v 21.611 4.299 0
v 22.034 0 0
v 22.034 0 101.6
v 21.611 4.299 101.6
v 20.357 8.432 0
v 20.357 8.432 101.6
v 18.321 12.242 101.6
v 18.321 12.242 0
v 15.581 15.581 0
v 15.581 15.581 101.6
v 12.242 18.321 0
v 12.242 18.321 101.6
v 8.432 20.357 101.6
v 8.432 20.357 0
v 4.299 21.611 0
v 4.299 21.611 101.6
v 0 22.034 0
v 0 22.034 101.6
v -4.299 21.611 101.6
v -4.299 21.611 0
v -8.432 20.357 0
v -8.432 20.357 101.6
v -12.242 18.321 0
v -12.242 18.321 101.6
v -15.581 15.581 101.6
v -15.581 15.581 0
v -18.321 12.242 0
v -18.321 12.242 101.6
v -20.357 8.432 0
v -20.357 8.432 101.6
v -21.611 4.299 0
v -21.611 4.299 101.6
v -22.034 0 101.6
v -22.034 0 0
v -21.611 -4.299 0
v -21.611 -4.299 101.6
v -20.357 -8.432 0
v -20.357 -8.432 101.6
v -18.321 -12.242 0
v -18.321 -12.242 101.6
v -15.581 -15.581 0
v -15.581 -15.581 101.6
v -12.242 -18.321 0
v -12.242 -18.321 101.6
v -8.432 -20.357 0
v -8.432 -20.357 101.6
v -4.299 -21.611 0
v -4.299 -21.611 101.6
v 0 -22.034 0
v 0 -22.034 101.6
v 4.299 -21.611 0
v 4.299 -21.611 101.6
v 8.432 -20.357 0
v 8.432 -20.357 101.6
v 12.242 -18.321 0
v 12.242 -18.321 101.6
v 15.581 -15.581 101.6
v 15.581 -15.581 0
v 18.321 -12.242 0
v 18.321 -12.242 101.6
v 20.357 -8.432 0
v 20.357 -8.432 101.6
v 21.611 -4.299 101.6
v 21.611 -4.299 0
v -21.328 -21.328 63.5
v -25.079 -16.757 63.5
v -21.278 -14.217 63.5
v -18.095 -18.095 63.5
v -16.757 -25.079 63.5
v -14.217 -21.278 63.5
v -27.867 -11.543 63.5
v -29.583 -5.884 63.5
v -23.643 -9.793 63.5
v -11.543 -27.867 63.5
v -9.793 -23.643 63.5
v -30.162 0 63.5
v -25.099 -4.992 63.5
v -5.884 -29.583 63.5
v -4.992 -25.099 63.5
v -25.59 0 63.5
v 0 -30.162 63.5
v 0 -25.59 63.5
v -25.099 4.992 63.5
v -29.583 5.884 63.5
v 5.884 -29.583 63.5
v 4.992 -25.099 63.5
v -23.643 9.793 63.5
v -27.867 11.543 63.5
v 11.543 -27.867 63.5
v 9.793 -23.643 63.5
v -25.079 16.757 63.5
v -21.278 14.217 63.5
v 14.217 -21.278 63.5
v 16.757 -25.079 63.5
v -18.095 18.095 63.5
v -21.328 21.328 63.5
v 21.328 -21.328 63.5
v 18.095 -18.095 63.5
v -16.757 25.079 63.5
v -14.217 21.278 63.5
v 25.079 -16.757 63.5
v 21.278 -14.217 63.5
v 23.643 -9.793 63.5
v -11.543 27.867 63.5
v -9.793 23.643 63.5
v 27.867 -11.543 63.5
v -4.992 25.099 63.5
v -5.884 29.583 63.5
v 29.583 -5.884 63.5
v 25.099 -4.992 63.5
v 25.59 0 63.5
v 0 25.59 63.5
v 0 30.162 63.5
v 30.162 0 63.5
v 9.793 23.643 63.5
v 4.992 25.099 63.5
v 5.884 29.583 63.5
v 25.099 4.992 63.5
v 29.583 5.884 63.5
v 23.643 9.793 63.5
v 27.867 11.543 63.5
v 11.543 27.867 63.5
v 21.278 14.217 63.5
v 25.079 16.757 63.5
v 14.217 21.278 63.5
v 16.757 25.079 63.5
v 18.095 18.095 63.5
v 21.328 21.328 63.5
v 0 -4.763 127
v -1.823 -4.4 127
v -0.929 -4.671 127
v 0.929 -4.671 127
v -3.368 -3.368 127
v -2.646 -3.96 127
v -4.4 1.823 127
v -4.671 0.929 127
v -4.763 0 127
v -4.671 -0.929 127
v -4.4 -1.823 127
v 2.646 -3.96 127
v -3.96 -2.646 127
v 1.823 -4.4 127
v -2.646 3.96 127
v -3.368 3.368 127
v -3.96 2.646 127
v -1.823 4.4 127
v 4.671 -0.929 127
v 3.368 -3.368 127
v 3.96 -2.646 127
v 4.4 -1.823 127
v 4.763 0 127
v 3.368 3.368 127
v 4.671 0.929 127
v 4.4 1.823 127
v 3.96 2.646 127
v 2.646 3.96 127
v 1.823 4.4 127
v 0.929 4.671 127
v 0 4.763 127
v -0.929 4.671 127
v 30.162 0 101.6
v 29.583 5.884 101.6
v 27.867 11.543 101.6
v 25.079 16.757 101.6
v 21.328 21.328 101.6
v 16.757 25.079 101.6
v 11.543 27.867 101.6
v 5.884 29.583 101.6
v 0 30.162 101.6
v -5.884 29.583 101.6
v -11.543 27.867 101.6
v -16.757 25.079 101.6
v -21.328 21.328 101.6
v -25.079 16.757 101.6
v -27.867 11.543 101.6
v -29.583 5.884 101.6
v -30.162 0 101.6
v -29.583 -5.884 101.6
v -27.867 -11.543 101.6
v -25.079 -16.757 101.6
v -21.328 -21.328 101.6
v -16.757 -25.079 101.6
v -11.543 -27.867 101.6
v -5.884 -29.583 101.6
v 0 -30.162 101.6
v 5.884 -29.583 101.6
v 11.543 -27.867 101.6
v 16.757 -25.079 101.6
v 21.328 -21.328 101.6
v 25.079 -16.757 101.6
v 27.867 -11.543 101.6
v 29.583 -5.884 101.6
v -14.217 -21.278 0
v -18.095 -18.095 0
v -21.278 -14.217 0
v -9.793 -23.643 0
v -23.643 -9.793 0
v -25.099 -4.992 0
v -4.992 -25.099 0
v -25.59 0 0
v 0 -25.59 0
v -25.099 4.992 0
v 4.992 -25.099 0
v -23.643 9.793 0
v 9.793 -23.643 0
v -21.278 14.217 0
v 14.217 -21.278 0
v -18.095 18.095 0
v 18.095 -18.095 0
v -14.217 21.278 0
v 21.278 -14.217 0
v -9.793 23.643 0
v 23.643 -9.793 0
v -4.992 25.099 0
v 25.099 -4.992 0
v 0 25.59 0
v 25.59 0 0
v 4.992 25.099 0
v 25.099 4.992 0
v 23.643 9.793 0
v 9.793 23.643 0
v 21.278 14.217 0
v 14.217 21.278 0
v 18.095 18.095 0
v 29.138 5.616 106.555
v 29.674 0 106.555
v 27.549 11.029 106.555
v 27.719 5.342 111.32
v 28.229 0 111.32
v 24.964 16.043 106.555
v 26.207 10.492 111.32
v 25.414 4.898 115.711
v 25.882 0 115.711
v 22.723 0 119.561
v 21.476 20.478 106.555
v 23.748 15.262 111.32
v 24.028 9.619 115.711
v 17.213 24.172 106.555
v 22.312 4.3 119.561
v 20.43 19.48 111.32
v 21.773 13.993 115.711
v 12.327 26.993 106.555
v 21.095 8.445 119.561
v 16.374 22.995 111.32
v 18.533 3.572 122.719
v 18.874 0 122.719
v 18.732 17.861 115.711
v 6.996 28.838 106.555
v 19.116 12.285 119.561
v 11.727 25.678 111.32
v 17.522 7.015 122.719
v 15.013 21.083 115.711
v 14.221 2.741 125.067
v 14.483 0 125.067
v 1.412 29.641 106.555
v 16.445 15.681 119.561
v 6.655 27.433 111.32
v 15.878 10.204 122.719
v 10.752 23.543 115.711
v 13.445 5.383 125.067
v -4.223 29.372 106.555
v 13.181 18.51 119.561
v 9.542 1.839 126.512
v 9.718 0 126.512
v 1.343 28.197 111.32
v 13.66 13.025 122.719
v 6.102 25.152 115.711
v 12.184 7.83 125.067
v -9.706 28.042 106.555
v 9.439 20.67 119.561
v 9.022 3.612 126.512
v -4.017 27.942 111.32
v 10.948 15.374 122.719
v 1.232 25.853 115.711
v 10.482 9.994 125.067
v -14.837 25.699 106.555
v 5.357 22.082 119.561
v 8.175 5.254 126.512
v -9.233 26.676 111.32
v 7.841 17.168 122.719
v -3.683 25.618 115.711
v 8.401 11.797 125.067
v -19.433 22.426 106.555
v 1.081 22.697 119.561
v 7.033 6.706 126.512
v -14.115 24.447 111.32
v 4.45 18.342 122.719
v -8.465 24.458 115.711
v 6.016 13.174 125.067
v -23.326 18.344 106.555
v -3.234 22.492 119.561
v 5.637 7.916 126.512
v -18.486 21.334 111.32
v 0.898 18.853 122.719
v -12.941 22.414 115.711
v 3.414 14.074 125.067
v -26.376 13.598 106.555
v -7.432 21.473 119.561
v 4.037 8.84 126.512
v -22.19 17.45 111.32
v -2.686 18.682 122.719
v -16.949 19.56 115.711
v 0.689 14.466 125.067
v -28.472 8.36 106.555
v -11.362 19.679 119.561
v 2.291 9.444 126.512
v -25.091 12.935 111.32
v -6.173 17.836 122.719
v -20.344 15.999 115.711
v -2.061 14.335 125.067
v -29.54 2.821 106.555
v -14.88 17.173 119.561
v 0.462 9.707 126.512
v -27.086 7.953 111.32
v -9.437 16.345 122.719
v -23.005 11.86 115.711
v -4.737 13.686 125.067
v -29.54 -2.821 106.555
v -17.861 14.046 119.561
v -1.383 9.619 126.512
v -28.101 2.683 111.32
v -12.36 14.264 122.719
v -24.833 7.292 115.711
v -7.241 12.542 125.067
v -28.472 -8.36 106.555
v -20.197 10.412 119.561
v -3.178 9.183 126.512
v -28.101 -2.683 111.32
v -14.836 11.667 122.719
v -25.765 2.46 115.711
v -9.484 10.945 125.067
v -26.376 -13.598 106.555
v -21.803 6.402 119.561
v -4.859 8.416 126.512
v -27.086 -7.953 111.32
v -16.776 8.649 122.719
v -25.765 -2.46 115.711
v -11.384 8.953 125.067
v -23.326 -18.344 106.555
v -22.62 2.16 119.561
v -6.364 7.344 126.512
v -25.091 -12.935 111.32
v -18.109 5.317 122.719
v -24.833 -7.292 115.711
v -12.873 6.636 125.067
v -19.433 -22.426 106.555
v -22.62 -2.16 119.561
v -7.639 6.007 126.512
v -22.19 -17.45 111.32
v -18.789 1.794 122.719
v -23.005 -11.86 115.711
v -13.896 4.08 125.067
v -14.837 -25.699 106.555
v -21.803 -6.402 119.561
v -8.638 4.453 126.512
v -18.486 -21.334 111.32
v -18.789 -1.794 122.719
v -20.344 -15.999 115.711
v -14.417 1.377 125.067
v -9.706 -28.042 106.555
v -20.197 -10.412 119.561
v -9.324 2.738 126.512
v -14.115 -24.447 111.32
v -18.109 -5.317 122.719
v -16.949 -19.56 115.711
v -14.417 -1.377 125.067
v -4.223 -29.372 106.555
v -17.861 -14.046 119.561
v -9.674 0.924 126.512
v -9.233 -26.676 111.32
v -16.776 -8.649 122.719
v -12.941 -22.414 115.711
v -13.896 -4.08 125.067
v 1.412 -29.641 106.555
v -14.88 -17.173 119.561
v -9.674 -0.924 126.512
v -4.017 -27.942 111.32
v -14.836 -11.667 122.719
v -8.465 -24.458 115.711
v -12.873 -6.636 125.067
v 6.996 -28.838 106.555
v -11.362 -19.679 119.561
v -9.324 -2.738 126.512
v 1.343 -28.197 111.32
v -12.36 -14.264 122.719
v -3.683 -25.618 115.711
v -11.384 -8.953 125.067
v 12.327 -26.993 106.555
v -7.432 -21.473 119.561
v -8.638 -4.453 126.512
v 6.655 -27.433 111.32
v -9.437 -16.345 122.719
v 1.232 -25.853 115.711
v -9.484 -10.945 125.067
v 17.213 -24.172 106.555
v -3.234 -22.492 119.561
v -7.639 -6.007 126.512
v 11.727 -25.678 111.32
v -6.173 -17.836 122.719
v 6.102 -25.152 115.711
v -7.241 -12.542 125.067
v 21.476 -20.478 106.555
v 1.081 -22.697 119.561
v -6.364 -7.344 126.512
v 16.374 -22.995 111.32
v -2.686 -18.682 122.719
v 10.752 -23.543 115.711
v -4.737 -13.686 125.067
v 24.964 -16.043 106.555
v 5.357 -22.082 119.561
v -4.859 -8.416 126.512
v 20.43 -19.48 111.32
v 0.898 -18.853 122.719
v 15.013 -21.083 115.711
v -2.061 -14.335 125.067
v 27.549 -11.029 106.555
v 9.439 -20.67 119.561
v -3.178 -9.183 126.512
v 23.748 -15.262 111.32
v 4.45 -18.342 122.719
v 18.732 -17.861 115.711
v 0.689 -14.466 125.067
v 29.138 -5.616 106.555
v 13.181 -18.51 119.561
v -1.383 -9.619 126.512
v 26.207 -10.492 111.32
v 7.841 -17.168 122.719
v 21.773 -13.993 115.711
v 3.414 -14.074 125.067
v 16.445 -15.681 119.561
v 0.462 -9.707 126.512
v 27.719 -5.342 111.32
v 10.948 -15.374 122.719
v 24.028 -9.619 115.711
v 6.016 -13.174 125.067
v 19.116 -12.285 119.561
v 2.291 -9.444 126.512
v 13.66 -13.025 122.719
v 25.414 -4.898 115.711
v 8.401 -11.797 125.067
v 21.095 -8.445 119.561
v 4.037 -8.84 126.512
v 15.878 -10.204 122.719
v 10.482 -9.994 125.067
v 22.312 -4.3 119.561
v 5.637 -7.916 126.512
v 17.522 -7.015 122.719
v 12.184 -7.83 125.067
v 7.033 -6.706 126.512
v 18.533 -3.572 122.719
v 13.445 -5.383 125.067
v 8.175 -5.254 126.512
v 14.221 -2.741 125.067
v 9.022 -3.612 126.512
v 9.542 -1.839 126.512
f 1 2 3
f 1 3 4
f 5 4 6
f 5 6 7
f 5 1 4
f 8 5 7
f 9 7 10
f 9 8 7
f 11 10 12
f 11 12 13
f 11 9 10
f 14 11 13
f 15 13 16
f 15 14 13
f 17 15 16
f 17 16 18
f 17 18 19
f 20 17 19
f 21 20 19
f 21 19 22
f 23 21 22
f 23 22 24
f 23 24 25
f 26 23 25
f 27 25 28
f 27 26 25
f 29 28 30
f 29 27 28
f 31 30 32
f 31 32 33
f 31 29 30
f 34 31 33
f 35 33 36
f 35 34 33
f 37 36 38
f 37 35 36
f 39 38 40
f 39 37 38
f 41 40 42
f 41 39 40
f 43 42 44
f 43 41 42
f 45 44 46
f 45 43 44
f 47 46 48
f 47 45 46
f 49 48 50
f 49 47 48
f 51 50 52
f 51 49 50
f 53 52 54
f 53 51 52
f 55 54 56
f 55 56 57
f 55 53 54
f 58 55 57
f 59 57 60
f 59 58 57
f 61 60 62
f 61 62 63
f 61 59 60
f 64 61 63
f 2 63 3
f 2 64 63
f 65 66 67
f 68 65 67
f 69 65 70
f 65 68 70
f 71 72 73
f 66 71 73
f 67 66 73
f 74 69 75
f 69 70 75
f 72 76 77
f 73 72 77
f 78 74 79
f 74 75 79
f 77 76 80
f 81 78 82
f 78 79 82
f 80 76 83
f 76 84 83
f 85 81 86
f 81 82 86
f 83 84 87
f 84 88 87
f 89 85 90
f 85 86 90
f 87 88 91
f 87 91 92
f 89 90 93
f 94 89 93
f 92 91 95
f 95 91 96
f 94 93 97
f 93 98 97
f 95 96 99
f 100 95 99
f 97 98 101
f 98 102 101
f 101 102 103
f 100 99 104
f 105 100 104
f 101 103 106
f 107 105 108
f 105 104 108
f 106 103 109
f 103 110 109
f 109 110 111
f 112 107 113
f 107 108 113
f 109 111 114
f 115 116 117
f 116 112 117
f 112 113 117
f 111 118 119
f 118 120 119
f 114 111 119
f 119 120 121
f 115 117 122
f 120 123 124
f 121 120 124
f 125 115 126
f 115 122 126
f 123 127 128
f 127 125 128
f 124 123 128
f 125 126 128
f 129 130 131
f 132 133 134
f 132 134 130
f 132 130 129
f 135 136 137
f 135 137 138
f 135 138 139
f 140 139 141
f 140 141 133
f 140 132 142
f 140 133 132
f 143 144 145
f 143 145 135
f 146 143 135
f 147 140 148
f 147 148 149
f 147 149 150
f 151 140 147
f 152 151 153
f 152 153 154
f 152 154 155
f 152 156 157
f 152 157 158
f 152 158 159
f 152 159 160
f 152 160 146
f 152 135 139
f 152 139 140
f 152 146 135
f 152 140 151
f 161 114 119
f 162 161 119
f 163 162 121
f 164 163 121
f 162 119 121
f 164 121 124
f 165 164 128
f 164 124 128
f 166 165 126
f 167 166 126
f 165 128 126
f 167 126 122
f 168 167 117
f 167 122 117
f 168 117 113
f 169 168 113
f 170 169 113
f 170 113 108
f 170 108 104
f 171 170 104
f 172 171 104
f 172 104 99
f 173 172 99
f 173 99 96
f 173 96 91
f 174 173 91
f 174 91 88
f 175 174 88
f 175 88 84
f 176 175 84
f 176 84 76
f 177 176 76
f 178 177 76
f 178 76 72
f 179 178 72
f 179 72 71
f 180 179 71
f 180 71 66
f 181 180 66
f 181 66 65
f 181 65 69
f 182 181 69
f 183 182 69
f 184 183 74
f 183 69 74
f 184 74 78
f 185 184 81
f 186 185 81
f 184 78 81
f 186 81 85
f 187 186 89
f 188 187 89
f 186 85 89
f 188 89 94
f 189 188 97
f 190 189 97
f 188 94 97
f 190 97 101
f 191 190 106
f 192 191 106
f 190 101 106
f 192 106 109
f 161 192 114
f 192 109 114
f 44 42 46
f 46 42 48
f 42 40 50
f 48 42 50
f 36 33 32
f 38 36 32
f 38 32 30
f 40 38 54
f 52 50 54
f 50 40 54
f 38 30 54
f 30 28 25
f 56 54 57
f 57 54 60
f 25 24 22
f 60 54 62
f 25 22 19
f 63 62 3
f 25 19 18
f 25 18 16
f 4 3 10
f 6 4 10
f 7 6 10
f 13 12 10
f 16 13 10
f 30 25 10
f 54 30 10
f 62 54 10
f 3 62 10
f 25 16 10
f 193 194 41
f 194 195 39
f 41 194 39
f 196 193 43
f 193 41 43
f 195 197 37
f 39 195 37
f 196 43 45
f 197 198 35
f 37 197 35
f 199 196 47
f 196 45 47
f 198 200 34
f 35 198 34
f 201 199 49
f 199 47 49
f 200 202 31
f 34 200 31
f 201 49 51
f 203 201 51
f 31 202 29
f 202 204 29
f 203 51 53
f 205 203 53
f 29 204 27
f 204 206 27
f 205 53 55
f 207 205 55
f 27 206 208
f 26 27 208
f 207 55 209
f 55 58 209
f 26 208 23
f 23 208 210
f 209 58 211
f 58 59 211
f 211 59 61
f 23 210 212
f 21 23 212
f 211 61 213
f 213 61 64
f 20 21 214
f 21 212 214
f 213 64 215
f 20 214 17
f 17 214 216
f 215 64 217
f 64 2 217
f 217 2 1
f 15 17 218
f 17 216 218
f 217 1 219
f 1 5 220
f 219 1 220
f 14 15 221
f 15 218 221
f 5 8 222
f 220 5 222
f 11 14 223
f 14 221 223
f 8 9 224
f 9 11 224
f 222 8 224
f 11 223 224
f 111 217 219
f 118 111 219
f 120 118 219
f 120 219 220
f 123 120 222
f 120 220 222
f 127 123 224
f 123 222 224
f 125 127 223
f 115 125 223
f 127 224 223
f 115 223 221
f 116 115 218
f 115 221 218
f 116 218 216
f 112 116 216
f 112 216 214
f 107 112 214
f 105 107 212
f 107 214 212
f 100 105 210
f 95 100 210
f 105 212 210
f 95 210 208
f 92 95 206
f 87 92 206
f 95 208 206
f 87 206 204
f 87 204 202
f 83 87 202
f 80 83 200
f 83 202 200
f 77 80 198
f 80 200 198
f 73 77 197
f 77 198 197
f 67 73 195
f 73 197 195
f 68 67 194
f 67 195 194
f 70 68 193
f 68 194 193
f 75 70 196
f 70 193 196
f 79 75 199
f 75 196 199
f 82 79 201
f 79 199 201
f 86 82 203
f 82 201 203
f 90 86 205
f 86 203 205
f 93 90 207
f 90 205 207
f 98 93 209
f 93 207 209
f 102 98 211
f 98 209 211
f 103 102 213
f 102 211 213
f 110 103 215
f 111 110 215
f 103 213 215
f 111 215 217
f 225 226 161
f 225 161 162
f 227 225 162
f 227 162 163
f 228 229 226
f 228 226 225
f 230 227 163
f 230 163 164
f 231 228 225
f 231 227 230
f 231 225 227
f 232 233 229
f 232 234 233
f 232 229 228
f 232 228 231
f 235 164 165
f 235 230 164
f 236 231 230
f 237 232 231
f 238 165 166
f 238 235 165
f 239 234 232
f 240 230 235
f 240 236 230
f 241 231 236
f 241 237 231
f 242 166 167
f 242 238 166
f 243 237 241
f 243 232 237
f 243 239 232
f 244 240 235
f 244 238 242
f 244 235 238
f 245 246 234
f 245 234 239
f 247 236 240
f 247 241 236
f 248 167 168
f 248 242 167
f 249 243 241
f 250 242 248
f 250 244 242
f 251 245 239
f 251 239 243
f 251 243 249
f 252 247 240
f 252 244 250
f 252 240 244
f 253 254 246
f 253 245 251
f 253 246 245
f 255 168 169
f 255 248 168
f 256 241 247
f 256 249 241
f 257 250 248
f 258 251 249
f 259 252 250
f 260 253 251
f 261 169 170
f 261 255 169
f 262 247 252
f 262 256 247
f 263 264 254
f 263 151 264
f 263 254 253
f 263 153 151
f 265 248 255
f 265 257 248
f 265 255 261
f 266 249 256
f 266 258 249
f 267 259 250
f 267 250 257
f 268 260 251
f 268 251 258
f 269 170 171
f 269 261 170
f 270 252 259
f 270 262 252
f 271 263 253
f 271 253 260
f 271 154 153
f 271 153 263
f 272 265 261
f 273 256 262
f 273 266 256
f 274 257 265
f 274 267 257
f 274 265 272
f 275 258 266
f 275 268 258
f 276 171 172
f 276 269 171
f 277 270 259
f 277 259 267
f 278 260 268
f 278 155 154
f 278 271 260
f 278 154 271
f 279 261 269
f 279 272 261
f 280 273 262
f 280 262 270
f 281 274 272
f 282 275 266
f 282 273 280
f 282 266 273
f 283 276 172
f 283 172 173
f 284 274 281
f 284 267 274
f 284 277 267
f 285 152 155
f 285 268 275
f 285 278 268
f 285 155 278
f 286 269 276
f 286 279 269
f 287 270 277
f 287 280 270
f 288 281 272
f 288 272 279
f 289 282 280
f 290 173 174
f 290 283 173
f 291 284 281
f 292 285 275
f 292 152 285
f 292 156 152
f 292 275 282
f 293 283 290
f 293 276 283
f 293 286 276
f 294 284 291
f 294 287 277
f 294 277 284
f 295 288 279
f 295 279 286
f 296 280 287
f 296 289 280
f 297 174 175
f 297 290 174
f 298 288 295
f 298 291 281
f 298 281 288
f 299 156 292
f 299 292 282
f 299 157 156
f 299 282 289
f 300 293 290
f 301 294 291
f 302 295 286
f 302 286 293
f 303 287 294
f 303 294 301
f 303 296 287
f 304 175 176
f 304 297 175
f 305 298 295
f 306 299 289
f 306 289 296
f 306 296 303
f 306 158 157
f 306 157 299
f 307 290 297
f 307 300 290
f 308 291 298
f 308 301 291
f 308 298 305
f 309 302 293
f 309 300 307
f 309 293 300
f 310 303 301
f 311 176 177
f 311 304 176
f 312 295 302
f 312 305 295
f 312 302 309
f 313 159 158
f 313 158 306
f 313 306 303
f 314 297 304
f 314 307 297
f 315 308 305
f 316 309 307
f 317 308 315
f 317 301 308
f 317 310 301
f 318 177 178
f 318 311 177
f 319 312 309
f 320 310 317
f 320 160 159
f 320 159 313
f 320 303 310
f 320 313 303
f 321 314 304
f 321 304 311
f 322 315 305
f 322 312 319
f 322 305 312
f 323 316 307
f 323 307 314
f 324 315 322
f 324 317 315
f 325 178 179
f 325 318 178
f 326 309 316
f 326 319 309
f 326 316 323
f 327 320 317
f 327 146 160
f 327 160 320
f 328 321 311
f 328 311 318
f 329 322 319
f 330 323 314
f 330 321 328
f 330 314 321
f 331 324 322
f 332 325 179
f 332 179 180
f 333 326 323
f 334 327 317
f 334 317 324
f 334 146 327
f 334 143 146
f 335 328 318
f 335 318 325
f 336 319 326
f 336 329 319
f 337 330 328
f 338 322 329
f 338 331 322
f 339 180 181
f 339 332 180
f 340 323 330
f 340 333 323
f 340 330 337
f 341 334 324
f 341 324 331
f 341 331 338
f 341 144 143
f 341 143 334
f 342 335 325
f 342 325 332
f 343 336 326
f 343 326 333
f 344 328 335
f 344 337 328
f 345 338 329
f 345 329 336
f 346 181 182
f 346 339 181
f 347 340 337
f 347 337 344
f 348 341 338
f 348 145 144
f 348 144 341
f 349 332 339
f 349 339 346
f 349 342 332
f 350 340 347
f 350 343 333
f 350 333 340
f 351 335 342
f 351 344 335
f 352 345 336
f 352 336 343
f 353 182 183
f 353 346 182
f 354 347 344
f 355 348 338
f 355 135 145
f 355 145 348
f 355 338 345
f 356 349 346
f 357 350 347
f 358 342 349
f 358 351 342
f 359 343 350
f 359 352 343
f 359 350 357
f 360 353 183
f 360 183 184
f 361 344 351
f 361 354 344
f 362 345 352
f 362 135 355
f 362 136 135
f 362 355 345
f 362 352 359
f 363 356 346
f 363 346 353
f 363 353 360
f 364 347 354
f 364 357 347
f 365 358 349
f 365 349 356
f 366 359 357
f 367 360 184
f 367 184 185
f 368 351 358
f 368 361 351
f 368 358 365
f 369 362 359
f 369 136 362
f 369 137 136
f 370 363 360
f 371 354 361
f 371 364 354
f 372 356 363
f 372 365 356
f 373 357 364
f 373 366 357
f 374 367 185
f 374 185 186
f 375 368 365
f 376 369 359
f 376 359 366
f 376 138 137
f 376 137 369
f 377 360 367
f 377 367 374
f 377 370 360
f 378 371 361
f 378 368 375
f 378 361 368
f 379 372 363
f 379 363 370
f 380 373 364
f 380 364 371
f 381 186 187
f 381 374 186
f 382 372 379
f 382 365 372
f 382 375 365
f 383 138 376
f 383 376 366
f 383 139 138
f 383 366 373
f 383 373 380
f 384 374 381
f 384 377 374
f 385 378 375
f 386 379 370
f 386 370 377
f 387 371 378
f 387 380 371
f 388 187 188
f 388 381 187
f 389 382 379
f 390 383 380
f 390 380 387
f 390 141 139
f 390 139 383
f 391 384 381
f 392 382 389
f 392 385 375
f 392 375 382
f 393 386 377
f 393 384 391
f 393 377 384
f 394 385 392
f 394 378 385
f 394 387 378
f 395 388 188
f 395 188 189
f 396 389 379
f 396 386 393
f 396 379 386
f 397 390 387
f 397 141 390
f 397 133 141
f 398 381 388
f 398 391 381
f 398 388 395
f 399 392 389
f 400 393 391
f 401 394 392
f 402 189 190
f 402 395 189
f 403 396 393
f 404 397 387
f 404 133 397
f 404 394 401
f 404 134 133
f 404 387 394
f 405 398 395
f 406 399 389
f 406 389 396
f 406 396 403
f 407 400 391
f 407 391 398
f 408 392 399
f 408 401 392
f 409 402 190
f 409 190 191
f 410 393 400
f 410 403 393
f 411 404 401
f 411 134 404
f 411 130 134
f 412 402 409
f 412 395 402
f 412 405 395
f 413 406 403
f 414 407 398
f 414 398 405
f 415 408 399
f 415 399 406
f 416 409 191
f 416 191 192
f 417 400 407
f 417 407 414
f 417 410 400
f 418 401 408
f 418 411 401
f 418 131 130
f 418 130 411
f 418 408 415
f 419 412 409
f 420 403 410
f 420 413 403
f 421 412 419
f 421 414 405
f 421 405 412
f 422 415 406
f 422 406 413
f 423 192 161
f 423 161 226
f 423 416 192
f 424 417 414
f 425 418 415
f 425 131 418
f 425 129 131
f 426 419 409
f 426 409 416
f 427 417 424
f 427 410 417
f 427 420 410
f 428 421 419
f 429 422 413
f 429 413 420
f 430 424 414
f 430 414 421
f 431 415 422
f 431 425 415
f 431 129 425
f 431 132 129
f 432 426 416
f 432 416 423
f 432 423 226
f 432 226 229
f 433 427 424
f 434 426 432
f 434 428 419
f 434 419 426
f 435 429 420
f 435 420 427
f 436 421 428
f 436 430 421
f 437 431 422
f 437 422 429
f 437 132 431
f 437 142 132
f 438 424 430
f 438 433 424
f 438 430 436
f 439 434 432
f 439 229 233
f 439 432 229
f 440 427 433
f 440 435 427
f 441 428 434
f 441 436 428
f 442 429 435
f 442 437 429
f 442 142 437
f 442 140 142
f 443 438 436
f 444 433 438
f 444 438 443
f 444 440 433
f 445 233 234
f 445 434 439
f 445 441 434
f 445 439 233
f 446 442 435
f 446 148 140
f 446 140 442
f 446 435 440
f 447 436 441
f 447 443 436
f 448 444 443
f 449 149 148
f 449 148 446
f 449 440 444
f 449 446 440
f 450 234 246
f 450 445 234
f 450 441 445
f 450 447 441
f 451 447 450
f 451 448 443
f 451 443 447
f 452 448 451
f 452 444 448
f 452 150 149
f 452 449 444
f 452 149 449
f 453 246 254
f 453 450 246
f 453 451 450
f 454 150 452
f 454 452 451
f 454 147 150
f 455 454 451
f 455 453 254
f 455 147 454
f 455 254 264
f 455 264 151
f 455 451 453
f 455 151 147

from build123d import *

# Parameters (mm, degrees)
F0_R     = 30.1625
F1_DEPTH = 127
F2_R     = 25.4
F3_R     = 22.0345
F4_DEPTH = 101.6
F5_R     = 30.1625
F5_R_2   = 25.5905
F6_DEPTH = 63.5


with BuildPart() as f1:
    # F0 (on Top) → F1 (new body)
    with BuildSketch(Plane.XY):
        Circle(F0_R)
    extrude(amount=F1_DEPTH)

    # F2
    f2_edges = [f1.edges().sort_by_distance(p)[0] for p in [
        (-30.1625, 0, 127),
    ]]
    fillet(f2_edges, radius=F2_R)

    # F3 (on face) → F4 (cut)
    with BuildSketch(Plane.XY):
        Circle(F3_R)
    extrude(amount=F4_DEPTH, mode=Mode.SUBTRACT)

    # F5 (on face) → F6 (cut)
    with BuildSketch(Plane.XY):
        Circle(F5_R)
        Circle(F5_R_2, mode=Mode.SUBTRACT)
    extrude(amount=F6_DEPTH, mode=Mode.SUBTRACT)


solid = f1.part
